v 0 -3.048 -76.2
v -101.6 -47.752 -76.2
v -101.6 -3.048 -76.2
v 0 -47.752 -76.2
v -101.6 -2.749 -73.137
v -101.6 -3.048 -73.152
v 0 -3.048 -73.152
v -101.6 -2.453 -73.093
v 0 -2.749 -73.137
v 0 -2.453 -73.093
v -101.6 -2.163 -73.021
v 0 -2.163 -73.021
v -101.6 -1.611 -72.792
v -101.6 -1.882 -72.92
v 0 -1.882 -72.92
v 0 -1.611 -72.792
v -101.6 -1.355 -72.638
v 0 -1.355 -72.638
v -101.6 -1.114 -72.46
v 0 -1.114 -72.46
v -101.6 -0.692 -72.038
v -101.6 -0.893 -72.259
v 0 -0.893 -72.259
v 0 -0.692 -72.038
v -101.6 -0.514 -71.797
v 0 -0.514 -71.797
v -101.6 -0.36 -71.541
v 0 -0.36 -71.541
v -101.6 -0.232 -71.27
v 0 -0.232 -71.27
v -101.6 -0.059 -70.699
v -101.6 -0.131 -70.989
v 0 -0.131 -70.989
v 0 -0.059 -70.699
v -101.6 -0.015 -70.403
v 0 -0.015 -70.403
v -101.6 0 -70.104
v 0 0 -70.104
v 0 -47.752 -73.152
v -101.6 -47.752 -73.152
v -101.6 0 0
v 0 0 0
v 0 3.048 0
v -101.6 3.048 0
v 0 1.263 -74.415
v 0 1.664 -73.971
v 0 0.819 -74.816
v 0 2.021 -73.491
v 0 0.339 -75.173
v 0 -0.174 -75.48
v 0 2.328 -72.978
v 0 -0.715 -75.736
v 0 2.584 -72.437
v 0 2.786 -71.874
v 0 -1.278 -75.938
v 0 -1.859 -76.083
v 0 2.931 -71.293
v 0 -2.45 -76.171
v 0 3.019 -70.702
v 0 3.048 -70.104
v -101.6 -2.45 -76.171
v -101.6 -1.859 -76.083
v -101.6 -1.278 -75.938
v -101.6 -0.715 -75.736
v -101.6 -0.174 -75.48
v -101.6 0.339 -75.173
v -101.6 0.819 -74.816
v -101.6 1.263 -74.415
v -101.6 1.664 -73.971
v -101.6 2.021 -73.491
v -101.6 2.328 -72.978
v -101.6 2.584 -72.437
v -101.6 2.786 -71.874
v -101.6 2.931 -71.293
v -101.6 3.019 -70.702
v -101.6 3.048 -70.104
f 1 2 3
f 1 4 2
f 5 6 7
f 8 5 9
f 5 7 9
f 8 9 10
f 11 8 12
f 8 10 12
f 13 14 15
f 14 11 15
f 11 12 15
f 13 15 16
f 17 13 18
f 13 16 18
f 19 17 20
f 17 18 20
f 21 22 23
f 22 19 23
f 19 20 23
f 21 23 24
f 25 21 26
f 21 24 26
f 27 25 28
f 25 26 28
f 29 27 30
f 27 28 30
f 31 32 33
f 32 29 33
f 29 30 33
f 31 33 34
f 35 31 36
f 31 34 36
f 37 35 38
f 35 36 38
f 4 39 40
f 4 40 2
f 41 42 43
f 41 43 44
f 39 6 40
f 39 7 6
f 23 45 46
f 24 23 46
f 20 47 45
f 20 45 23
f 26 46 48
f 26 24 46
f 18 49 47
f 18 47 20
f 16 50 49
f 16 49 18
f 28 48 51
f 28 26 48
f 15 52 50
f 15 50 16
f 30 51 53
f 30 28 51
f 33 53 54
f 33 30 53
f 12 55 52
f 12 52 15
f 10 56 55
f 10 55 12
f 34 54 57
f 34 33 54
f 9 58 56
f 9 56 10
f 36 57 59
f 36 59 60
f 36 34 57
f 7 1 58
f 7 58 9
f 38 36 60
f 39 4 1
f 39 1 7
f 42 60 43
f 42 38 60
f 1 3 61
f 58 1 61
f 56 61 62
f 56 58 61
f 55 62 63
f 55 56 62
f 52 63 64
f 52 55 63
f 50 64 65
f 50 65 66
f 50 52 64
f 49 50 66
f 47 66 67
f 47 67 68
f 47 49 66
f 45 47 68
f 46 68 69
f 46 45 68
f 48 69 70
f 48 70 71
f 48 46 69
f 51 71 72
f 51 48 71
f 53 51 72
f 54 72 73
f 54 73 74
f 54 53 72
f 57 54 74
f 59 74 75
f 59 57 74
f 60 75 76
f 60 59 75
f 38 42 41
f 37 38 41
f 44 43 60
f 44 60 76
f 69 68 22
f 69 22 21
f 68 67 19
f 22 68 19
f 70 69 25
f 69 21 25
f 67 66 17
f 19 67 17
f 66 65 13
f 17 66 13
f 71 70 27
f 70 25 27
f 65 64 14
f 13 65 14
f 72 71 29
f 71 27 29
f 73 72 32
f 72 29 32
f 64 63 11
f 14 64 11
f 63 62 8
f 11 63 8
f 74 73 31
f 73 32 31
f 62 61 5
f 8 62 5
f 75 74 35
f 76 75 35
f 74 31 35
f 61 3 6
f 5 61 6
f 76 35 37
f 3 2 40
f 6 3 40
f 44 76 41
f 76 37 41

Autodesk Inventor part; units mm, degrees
ref_plane "YZ Plane" through (0, 0, 0) normal (1, 0, 0) x (0, 1, 0)
ref_plane "XZ Plane" through (0, 0, 0) normal (0, 1, 0) x (-1, 0, 0)
ref_plane "XY Plane" through (0, 0, 0) normal (0, 0, 1) x (1, 0, 0)
sketch "Sketch1" plane through (0, 0, 0) normal (0, 1, 0) x (-1, 0, 0)
  line L0 (0, 0) -> (101.6, 0)
  line L1 (101.6, 0) -> (101.6, -76.2)
  line L2 (101.6, -76.2) -> (0, -76.2)
  line L3 (0, -76.2) -> (0, 0)
  dimension "d0" = 101.6
  dimension "d1" = 76.2
extrude "Plate1" add sketch "Sketch1" along normal blind 3.048
sketch "Sketch2" plane through (0, 3.048, -73.152) normal (0, 0, -1) x (-1, 0, 0)
  line L0 (101.6, 0) -> (0, 0)
  line L1 (0, 0) -> (0, -50.8)
  line L2 (0, -50.8) -> (101.6, -50.8)
  line L3 (101.6, -50.8) -> (101.6, 0)
edge flange "Flange1" height 50.8 angle 90 thickness 3.048 bend radius 3.048 thickness toward (0, 0, -1) relief tear relief width 3.048 relief depth 1.524 edges at (-50.8, 0, -76.2) wall of the first edge with corners at (-101.6, 3.048, -73.152) (0, 3.048, -73.152) (0, -47.752, -73.152) (-101.6, -47.752, -73.152)
bend "Bend1"
corner "Corner1"
equation "\"d3\" = BendReliefWidth"
equation "\"d4\" = BendReliefDepth"
equation "\"d5\" = MinimumRemnant"
equation "\"d6\" = BendRadius"
equation "\"d9\" = BendRadius"
equation "\"d10\" = CornerReliefSize"
equation "\"d11\" = GapSize"
equation "\"d12\" = JacobiRadiusSize"
equation "\"BendRadius\" = Thickness"
equation "\"BendReliefWidth\" = Thickness"
equation "\"BendReliefDepth\" = 0.5 * Thickness"
equation "\"CornerReliefSize\" = 4 * Thickness"
equation "\"MinimumRemnant\" = 2 * Thickness"
equation "\"TransitionRadius\" = BendRadius"
equation "\"JacobiRadiusSize\" = BendRadius"
equation "\"GapSize\" = Thickness"
equation "\"d2\" = BendRadius"
equation "\"Thickness\" = 3.048"
properties part number "motorBracket"
